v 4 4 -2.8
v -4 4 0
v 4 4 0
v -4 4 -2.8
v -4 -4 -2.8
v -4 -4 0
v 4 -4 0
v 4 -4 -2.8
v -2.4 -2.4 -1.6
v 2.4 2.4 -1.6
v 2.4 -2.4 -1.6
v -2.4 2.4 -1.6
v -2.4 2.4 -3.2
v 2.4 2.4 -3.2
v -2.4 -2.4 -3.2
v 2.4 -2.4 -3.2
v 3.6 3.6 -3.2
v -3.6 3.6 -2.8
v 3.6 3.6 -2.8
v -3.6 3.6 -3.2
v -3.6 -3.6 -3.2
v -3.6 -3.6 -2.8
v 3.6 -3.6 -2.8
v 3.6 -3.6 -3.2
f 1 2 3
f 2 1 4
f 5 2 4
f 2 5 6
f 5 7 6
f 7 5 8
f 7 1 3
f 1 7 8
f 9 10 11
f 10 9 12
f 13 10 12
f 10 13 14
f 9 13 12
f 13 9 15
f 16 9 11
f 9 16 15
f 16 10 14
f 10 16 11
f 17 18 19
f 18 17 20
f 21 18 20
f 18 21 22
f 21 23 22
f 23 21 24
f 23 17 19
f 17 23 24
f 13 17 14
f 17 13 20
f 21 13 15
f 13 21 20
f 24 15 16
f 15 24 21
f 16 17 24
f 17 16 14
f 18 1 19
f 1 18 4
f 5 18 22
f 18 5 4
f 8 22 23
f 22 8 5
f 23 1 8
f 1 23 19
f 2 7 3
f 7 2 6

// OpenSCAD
// file: ../p/box5.scad
use <../lib.scad>
function ldraw_lib__box5() = [
// 0 Box with 5 Faces and All Edges
// 0 Name: box5.dat
// 0 Author: James Jessiman
// 0 !LDRAW_ORG Primitive UPDATE 2012-01
// 0 !LICENSE Licensed under CC BY 4.0 : see CAreadme.txt
// 
// 0 BFC CERTIFY CCW
  [0,"BFC","CERTIFY"],
  [0,"BFC","CCW"],
// 
// 0 !HISTORY 2002-04-03 [sbliss] Modified for BFC compliance
// 0 !HISTORY 2002-04-25 [PTadmin] Official Update 2002-02
// 0 !HISTORY 2007-06-24 [PTadmin] Header formatted for Contributor Agreement
// 0 !HISTORY 2008-07-01 [PTadmin] Official Update 2008-01
// 0 !HISTORY 2012-02-16 [Philo] Changed to CCW
// 0 !HISTORY 2012-03-30 [PTadmin] Official Update 2012-01
// 
// 
// 2 24 1 1 1 -1 1 1
  [2,24,1,1,1,-1,1,1],
// 2 24 -1 1 1 -1 1 -1
  [2,24,-1,1,1,-1,1,-1],
// 2 24 -1 1 -1 1 1 -1
  [2,24,-1,1,-1,1,1,-1],
// 2 24 1 1 -1 1 1 1
  [2,24,1,1,-1,1,1,1],
// 2 24 1 0 1 -1 0 1
  [2,24,1,0,1,-1,0,1],
// 2 24 -1 0 1 -1 0 -1
  [2,24,-1,0,1,-1,0,-1],
// 2 24 -1 0 -1 1 0 -1
  [2,24,-1,0,-1,1,0,-1],
// 2 24 1 0 -1 1 0 1
  [2,24,1,0,-1,1,0,1],
// 2 24 1 0 1 1 1 1
  [2,24,1,0,1,1,1,1],
// 2 24 -1 0 1 -1 1 1
  [2,24,-1,0,1,-1,1,1],
// 2 24 1 0 -1 1 1 -1
  [2,24,1,0,-1,1,1,-1],
// 2 24 -1 0 -1 -1 1 -1
  [2,24,-1,0,-1,-1,1,-1],
// 4 16 -1 1 1 1 1 1 1 1 -1 -1 1 -1
  [4,16,-1,1,1,1,1,1,1,1,-1,-1,1,-1],
// 4 16 -1 1 1 -1 0 1 1 0 1 1 1 1
  [4,16,-1,1,1,-1,0,1,1,0,1,1,1,1],
// 4 16 -1 1 -1 -1 0 -1 -1 0 1 -1 1 1
  [4,16,-1,1,-1,-1,0,-1,-1,0,1,-1,1,1],
// 4 16 1 1 -1 1 0 -1 -1 0 -1 -1 1 -1
  [4,16,1,1,-1,1,0,-1,-1,0,-1,-1,1,-1],
// 4 16 1 1 1 1 0 1 1 0 -1 1 1 -1
  [4,16,1,1,1,1,0,1,1,0,-1,1,1,-1],
];
module ldraw_lib__box5(step=0, col=false, unit=2/5, alt=false, line=0.2, solid=!$preview)
    makepoly(ldraw_lib__box5(), step=step, col=col, unit=unit, alt=alt, line=line, solid=solid);
ldraw_lib__box5(line=0.2);
// file: ../p/box4.scad
use <../lib.scad>
function ldraw_lib__box4() = [
// 0 Box with 4 Faces (2 Parallel Pairs) and All Edges
// 0 Name: box4.dat
// 0 Author: James Jessiman
// 0 !LDRAW_ORG Primitive UPDATE 2012-01
// 0 !LICENSE Licensed under CC BY 4.0 : see CAreadme.txt
// 
// 0 BFC CERTIFY CCW
  [0,"BFC","CERTIFY"],
  [0,"BFC","CCW"],
// 
// 0 !HISTORY 2002-04-03 [sbliss] Modified for BFC compliance
// 0 !HISTORY 2002-04-25 [PTadmin] Official Update 2002-02
// 0 !HISTORY 2007-06-24 [PTadmin] Header formatted for Contributor Agreement
// 0 !HISTORY 2008-07-01 [PTadmin] Official Update 2008-01
// 0 !HISTORY 2012-02-16 [Philo] Changed to CCW
// 0 !HISTORY 2012-03-30 [PTadmin] Official Update 2012-01
// 
// 
// 2 24 1 1 1 -1 1 1
  [2,24,1,1,1,-1,1,1],
// 2 24 -1 1 1 -1 1 -1
  [2,24,-1,1,1,-1,1,-1],
// 2 24 -1 1 -1 1 1 -1
  [2,24,-1,1,-1,1,1,-1],
// 2 24 1 1 -1 1 1 1
  [2,24,1,1,-1,1,1,1],
// 2 24 1 0 1 -1 0 1
  [2,24,1,0,1,-1,0,1],
// 2 24 -1 0 1 -1 0 -1
  [2,24,-1,0,1,-1,0,-1],
// 2 24 -1 0 -1 1 0 -1
  [2,24,-1,0,-1,1,0,-1],
// 2 24 1 0 -1 1 0 1
  [2,24,1,0,-1,1,0,1],
// 2 24 1 0 1 1 1 1
  [2,24,1,0,1,1,1,1],
// 2 24 -1 0 1 -1 1 1
  [2,24,-1,0,1,-1,1,1],
// 2 24 1 0 -1 1 1 -1
  [2,24,1,0,-1,1,1,-1],
// 2 24 -1 0 -1 -1 1 -1
  [2,24,-1,0,-1,-1,1,-1],
// 4 16 -1 1 1 -1 0 1 1 0 1 1 1 1
  [4,16,-1,1,1,-1,0,1,1,0,1,1,1,1],
// 4 16 -1 1 -1 -1 0 -1 -1 0 1 -1 1 1
  [4,16,-1,1,-1,-1,0,-1,-1,0,1,-1,1,1],
// 4 16 1 1 -1 1 0 -1 -1 0 -1 -1 1 -1
  [4,16,1,1,-1,1,0,-1,-1,0,-1,-1,1,-1],
// 4 16 1 1 1 1 0 1 1 0 -1 1 1 -1
  [4,16,1,1,1,1,0,1,1,0,-1,1,1,-1],
];
module ldraw_lib__box4(step=0, col=false, unit=2/5, alt=false, line=0.2, solid=!$preview)
    makepoly(ldraw_lib__box4(), step=step, col=col, unit=unit, alt=alt, line=line, solid=solid);
ldraw_lib__box4(line=0.2);
// file: s/3070bs01.scad
use <../../lib.scad>
use <../../p/box4.scad>
use <../../p/box5.scad>
function ldraw_lib__s__3070bs01() = [
// 0 ~Tile  1 x  1 with Groove without Top Face
// 0 Name: s\3070bs01.dat
// 0 Author: Chris Dee [cwdee]
// 0 !LDRAW_ORG Subpart UPDATE 2009-02
// 0 !LICENSE Licensed under CC BY 4.0 : see CAreadme.txt
// 
// 0 BFC CERTIFY CCW
  [0,"BFC","CERTIFY"],
  [0,"BFC","CCW"],
// 
// 0 !HISTORY 2009-09-03 [PTadmin] Official Update 2009-02
// 
// 
// 1 16 0 0 0 10 0 0 0 7 0 0 0 10 box4.dat
  [1,16,0,0,0,10,0,0,0,7,0,0,0,10, ldraw_lib__box4()],
// 0 BFC INVERTNEXT
  [0,"BFC","INVERTNEXT"],
// 1 16 0 8 0 6 0 0 0 -4 0 0 0 6 box5.dat
  [1,16,0,8,0,6,0,0,0,-4,0,0,0,6, ldraw_lib__box5()],
// 1 16 0 7 0 9 0 0 0 1 0 0 0 9 box4.dat
  [1,16,0,7,0,9,0,0,0,1,0,0,0,9, ldraw_lib__box4()],
// 
// 4 16 9 8 9 6 8 6 -6 8 6 -9 8 9
  [4,16,9,8,9,6,8,6,-6,8,6,-9,8,9],
// 4 16 -9 8 9 -6 8 6 -6 8 -6 -9 8 -9
  [4,16,-9,8,9,-6,8,6,-6,8,-6,-9,8,-9],
// 4 16 -9 8 -9 -6 8 -6 6 8 -6 9 8 -9
  [4,16,-9,8,-9,-6,8,-6,6,8,-6,9,8,-9],
// 4 16 9 8 -9 6 8 -6 6 8 6 9 8 9
  [4,16,9,8,-9,6,8,-6,6,8,6,9,8,9],
// 
// 4 16 10 7 10 9 7 9 -9 7 9 -10 7 10
  [4,16,10,7,10,9,7,9,-9,7,9,-10,7,10],
// 4 16 -10 7 10 -9 7 9 -9 7 -9 -10 7 -10
  [4,16,-10,7,10,-9,7,9,-9,7,-9,-10,7,-10],
// 4 16 -10 7 -10 -9 7 -9 9 7 -9 10 7 -10
  [4,16,-10,7,-10,-9,7,-9,9,7,-9,10,7,-10],
// 4 16 10 7 -10 9 7 -9 9 7 9 10 7 10
  [4,16,10,7,-10,9,7,-9,9,7,9,10,7,10],
// 0
];
module ldraw_lib__s__3070bs01(step=0, col=false, unit=2/5, alt=false, line=0.2, solid=!$preview)
    makepoly(ldraw_lib__s__3070bs01(), step=step, col=col, unit=unit, alt=alt, line=line, solid=solid);
ldraw_lib__s__3070bs01(line=0.2);
// main file
use <../lib.scad>
use <s/3070bs01.scad>
function ldraw_lib__3070b() = [
// 0 Tile  1 x  1 with Groove
// 0 Name: 3070b.dat
// 0 Author: Chris Dee [cwdee]
// 0 !LDRAW_ORG Part UPDATE 2025-09
// 0 !LICENSE Licensed under CC BY 4.0 : see CAreadme.txt
// 
// 0 BFC CERTIFY CCW
  [0,"BFC","CERTIFY"],
  [0,"BFC","CCW"],
// 
// 0 !KEYWORDS BrickLink 3070
// 
// 0 !HISTORY 2009-09-03 [PTadmin] Official Update 2009-02
// 0 !HISTORY 2025-09-27 [OrionP] Changed winding to CCW
// 0 !HISTORY 2025-09-29 [OrionP] Official Update 2025-09
// 
// 1 16 0 0 0 1 0 0 0 1 0 0 0 1 s\3070bs01.dat
  [1,16,0,0,0,1,0,0,0,1,0,0,0,1, ldraw_lib__s__3070bs01()],
// 4 16 -10 0 10 -10 0 -10 10 0 -10 10 0 10
  [4,16,-10,0,10,-10,0,-10,10,0,-10,10,0,10],
// 0
];
module ldraw_lib__3070b(step=0, col=false, unit=2/5, alt=false, line=0.2, solid=!$preview)
    makepoly(ldraw_lib__3070b(), step=step, col=col, unit=unit, alt=alt, line=line, solid=solid);
ldraw_lib__3070b(line=0.2);
